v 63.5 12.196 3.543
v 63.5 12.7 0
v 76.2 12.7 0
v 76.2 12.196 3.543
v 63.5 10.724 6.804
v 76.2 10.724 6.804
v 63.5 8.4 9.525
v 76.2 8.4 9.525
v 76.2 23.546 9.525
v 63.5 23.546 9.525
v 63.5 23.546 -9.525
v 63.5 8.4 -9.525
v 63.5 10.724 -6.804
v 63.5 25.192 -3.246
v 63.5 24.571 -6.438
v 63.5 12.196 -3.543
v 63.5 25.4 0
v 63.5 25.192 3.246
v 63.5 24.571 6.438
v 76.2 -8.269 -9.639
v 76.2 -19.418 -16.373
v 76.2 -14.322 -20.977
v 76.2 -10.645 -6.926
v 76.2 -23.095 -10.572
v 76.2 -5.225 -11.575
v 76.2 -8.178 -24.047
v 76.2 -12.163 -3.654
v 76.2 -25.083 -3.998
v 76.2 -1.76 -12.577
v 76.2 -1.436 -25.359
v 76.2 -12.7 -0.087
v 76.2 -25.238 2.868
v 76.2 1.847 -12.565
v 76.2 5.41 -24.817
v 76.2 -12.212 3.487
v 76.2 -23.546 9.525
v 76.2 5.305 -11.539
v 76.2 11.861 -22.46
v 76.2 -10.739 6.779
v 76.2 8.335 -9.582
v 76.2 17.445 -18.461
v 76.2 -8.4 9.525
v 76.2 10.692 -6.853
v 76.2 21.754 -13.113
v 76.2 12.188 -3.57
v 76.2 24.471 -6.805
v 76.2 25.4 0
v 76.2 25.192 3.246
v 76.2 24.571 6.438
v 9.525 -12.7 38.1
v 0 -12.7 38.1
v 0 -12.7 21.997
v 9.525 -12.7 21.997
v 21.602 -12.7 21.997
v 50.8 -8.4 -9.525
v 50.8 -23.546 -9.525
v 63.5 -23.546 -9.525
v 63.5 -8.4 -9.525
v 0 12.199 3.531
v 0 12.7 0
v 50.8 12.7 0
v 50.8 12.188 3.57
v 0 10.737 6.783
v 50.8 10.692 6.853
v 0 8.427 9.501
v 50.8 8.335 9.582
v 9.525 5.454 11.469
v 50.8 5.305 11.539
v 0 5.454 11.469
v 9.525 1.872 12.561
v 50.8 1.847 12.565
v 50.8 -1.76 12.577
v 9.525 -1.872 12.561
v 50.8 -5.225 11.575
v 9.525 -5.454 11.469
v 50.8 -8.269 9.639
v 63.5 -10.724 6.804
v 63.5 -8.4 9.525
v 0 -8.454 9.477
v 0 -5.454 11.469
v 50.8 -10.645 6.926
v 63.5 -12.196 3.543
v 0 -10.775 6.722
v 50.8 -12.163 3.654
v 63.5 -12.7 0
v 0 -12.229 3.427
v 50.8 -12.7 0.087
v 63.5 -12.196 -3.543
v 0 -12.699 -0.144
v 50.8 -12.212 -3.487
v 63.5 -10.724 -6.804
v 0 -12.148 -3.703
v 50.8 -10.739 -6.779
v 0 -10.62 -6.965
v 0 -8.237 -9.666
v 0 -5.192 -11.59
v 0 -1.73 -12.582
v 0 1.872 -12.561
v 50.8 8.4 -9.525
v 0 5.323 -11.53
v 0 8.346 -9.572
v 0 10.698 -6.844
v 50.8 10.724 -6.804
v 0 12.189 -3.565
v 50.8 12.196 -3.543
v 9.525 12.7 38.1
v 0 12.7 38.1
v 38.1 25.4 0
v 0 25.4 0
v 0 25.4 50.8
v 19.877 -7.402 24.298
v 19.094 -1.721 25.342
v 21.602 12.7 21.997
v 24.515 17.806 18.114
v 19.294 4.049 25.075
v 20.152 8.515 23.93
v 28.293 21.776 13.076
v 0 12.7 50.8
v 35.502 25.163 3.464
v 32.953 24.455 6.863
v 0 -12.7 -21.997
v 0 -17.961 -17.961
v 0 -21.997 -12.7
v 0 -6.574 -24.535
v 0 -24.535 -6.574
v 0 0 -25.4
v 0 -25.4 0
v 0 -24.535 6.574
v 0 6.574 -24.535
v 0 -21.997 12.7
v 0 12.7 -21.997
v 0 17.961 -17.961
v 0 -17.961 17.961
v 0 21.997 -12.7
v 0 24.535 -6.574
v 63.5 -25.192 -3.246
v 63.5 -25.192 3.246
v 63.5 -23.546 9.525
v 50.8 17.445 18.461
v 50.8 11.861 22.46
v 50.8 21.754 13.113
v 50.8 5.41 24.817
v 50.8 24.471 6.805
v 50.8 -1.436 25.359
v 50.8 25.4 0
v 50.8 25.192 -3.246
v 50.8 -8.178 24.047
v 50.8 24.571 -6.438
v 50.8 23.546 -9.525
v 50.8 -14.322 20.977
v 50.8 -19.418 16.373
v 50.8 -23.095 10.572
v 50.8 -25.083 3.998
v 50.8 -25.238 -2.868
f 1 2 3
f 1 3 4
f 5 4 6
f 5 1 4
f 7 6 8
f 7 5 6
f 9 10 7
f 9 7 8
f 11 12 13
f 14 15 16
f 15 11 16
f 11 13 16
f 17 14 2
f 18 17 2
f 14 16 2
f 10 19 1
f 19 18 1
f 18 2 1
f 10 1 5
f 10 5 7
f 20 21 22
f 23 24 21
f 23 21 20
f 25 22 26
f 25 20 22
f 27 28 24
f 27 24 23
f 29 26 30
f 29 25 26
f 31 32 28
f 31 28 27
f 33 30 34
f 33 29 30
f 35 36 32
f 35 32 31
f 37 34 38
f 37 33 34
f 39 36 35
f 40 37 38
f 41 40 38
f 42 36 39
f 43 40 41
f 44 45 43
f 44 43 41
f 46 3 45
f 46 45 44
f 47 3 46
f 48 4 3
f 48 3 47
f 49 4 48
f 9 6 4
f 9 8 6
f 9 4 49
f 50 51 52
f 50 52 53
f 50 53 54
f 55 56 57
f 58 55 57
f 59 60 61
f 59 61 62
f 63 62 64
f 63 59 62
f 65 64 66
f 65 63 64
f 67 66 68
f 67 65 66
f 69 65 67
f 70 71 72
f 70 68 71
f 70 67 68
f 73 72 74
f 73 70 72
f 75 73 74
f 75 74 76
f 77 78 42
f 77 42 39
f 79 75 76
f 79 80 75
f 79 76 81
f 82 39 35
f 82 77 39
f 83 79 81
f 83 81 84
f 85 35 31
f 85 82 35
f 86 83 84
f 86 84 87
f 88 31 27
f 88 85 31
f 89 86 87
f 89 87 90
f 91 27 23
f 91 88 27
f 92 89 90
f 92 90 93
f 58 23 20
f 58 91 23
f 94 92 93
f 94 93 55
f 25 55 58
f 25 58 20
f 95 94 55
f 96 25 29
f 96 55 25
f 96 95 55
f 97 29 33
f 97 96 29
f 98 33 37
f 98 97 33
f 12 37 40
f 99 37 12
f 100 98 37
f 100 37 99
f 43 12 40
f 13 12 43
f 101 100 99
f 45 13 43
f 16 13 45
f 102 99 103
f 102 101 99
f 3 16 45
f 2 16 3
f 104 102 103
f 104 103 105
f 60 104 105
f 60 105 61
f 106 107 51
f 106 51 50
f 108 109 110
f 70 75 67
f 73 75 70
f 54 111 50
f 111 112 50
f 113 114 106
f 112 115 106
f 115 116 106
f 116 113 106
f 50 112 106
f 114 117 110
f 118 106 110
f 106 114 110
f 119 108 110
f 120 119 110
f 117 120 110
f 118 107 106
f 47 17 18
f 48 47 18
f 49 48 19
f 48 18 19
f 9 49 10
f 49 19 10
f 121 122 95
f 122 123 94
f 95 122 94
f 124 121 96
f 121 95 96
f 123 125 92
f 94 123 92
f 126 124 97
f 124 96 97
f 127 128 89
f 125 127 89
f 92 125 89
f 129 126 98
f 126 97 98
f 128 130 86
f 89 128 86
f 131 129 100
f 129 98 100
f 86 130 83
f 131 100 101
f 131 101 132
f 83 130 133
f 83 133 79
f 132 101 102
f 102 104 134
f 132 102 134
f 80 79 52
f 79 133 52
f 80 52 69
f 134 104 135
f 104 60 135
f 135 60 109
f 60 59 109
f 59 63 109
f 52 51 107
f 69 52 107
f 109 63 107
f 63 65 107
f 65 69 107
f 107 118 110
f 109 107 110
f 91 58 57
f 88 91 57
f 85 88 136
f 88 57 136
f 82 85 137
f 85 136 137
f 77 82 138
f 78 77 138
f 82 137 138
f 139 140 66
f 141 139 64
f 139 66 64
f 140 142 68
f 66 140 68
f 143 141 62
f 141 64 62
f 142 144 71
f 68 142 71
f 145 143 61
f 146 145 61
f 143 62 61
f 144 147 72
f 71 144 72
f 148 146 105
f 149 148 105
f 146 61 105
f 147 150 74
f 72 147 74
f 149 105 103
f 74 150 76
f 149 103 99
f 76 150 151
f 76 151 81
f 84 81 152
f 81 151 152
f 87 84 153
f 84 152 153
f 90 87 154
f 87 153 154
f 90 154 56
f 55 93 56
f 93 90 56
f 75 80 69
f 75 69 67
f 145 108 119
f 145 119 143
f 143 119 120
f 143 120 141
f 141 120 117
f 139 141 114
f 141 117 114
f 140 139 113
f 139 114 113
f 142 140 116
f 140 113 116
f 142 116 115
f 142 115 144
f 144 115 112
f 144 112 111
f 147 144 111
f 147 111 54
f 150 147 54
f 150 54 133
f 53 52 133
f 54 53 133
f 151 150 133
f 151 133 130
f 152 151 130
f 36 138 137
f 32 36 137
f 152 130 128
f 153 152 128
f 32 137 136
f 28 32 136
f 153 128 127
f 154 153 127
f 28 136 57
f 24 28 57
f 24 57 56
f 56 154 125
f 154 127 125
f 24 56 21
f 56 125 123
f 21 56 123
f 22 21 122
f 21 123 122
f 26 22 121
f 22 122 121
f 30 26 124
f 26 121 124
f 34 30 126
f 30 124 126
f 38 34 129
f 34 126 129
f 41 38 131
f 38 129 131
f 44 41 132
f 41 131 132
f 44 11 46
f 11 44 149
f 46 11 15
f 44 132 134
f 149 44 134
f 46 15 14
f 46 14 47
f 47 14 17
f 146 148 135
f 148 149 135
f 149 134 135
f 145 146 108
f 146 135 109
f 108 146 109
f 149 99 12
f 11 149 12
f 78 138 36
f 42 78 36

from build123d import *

# Parameters (mm, degrees)
F0_R     = 25.4
F0_R_2   = 12.7
F1_DEPTH = 76.2
F3_DEPTH = 27.94
F6_DEPTH = 12.7
F7_W     = 9.525
F7_H     = 10.5276096967
F7_H_2   = 16.1029547439
F8_DEPTH = 25.4


with BuildPart() as f1:
    # F0 (on Right) → F1 (new body)
    with BuildSketch(Plane.YZ):
        Circle(F0_R)
        Circle(F0_R_2, mode=Mode.SUBTRACT)
    extrude(amount=F1_DEPTH)

    # F2 (on Front) → F3 (cut, symmetric)
    with BuildSketch(Plane.XZ):
        Polygon((76.2, 25.4), (50.8, 25.4), (50.8, -9.525), (63.5, -9.525), (63.5, 9.525), (76.2, 9.525), align=None)
    extrude(amount=F3_DEPTH, both=True, mode=Mode.SUBTRACT)

    # F5 (on offset) → F6 (join)
    with BuildSketch(Plane.XZ.offset(-25.4)):
        Polygon((0, 0), (38.1, 0), (0, 50.8), align=None)
    extrude(amount=F6_DEPTH)

    # F7 (on face) → F8 (join)
    with BuildSketch(Plane.XZ.offset(-12.7)):
        with Locations((4.7625, 16.7332404078)):
            Rectangle(F7_W, F7_H)
        Polygon((21.6022160579, 21.9970452561), (9.525, 38.1), (9.525, 21.9970452561), align=None)
        with Locations((4.7625, 30.0485226281)):
            Rectangle(F7_W, F7_H_2)
    extrude(amount=F8_DEPTH)


solid = f1.part
